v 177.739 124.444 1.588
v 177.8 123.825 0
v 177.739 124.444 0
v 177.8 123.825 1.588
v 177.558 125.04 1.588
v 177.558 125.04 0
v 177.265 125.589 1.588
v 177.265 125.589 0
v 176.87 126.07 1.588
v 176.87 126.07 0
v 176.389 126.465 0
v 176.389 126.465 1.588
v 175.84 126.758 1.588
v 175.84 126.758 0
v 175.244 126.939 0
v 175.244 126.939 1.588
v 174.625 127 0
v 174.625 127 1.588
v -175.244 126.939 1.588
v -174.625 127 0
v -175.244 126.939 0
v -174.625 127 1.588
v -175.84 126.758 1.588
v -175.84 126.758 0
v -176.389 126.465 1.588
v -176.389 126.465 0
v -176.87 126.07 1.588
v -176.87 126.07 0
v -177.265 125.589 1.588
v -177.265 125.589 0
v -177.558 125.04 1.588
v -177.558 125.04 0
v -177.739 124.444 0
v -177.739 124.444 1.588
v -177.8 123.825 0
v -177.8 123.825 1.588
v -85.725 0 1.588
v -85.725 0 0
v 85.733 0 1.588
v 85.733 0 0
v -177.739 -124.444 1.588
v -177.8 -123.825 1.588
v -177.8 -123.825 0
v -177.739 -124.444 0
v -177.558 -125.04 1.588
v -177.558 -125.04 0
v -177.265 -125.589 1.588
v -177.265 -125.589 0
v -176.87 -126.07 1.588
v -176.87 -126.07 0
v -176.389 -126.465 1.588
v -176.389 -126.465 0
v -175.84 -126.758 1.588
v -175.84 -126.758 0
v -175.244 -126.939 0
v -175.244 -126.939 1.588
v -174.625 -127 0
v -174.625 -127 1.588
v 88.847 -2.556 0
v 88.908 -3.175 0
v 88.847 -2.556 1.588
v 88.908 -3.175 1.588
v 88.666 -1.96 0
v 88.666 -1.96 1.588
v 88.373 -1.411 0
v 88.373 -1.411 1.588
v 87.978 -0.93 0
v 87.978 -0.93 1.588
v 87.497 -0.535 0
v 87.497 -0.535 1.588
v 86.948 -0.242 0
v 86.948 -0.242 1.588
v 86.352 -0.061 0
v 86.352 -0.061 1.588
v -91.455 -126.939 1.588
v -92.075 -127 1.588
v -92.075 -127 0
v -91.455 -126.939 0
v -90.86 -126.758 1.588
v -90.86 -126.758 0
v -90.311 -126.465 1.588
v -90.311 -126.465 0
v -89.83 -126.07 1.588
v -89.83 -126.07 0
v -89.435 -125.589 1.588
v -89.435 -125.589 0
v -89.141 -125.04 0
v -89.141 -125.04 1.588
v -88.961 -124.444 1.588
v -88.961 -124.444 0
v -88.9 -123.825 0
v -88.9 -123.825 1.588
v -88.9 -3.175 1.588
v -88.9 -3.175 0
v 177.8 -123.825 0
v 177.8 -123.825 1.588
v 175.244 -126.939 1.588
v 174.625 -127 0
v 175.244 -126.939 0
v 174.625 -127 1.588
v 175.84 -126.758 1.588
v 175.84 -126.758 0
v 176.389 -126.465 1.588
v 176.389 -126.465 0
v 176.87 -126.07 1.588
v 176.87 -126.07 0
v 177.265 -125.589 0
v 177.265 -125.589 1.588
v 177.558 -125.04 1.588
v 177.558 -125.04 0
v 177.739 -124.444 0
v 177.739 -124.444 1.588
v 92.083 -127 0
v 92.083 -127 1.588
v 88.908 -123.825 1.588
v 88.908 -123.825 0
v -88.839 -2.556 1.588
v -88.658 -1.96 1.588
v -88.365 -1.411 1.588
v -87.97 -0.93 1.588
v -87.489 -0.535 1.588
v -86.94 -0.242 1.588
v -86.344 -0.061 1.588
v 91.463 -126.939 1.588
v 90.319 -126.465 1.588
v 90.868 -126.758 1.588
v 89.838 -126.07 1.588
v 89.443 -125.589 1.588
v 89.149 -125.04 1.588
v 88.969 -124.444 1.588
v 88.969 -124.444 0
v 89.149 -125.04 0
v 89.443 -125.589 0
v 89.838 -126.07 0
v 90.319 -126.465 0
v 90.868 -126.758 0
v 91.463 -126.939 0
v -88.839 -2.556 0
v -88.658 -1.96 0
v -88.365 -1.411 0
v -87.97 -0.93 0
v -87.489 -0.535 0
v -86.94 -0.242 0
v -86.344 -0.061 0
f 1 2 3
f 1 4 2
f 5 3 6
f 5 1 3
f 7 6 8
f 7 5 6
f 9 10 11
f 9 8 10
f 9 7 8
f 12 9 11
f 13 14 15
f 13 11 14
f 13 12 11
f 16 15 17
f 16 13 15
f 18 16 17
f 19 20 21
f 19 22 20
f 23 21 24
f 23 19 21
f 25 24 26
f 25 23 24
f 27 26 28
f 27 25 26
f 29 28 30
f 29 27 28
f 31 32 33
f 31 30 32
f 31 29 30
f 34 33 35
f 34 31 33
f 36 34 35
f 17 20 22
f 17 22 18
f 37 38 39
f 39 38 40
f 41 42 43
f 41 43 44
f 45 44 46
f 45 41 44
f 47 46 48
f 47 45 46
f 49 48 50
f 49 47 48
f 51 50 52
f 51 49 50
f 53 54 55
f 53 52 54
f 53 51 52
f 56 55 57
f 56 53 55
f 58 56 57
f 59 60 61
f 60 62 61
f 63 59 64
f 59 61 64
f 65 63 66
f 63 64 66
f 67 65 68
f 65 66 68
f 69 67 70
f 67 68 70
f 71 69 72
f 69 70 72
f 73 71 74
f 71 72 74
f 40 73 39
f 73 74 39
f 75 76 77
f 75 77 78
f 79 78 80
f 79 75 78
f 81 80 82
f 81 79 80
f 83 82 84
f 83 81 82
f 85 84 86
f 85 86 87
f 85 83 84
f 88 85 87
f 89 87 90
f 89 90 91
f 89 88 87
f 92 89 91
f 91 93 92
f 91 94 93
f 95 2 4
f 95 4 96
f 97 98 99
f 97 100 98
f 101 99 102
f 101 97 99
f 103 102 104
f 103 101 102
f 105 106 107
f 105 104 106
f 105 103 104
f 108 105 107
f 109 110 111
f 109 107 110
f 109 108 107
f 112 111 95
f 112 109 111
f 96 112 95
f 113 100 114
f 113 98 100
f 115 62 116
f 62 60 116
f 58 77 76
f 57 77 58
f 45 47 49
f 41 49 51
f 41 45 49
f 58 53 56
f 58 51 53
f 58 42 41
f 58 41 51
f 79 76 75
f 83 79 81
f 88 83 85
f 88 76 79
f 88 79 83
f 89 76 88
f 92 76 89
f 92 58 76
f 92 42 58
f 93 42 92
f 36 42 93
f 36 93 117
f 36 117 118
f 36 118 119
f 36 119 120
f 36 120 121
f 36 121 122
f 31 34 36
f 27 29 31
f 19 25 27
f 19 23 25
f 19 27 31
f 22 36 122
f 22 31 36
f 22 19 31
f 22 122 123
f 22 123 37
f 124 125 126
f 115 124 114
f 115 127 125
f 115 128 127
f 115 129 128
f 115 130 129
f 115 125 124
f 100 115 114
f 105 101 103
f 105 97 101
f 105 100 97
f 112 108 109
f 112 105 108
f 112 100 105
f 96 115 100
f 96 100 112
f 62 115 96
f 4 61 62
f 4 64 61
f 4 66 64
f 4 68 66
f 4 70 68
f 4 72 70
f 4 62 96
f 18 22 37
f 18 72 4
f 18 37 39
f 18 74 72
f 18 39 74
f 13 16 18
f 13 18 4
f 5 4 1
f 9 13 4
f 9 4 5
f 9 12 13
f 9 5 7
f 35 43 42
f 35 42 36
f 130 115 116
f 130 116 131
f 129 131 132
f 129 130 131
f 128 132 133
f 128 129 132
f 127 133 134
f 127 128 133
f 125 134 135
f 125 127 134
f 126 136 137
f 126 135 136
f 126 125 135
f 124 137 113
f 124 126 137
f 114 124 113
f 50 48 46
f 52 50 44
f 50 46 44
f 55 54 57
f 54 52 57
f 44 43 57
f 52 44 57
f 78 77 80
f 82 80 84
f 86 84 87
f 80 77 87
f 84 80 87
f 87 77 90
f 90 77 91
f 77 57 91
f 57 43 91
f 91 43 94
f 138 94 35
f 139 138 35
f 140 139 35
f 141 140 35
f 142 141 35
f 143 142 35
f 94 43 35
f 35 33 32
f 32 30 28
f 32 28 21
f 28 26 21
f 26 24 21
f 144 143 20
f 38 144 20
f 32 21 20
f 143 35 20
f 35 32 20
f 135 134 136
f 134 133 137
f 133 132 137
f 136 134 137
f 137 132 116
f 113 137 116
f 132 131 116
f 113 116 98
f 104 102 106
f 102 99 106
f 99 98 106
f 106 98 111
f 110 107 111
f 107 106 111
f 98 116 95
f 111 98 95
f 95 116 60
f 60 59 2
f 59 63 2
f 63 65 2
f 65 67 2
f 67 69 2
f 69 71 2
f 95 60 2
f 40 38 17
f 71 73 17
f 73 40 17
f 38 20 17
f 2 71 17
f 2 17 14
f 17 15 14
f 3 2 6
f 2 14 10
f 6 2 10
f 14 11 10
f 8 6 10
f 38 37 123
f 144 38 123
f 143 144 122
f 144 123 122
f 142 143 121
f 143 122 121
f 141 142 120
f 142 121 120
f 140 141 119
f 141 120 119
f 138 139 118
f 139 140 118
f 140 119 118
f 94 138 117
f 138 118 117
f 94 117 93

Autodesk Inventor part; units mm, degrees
ref_plane "YZ Plane" through (0, 0, 0) normal (1, 0, 0) x (0, 1, 0)
ref_plane "XZ Plane" through (0, 0, 0) normal (0, 1, 0) x (-1, 0, 0)
ref_plane "XY Plane" through (0, 0, 0) normal (0, 0, 1) x (1, 0, 0)
sketch "Sketch1" plane through (0, 0, 0) normal (0, 0, 1) x (1, 0, 0)
  line L0 (-177.8, 127) -> (177.8, 127)
  line L1 (177.8, 127) -> (177.8, -127)
  line L2 (177.8, -127) -> (-177.8, -127)
  line L3 (-177.8, -127) -> (-177.8, 127)
  line L4 (-88.8998, 127) -> (-88.8998, -127)
  line L5 (88.9077, 127) -> (88.9077, -127)
  line L6 (-88.8998, 0) -> (88.9077, 0)
  point P0 (0, 0)
  dimension "d0" = 355.6
  dimension "d1" = 254
extrude "Extrusion1" add sketch "Sketch1" along normal blind 1.5875 contours L0 L4 L2 L3 | L0 L5 L6 L4 | L0 L1 L2 L5
fillet "Fillet1" radius 3.175 1 edges at (177.8, 127, 0.7937)
fillet "Fillet2" radius 3.175 1 edges at (177.8, -127, 0.7937)
fillet "Fillet3" radius 3.175 1 edges at (-88.8998, -127, 0.7937)
fillet "Fillet4" radius 3.175 1 edges at (-88.8998, 0, 0.7937)
fillet "Fillet5" radius 3.175 1 edges at (-177.8, -127, 0.7937)
fillet "Fillet6" radius 3.175 1 edges at (-177.8, 127, 0.7937)
fillet "Fillet7" radius 3.175 1 edges at (88.9077, -127, 0.7937)
fillet "Fillet8" radius 3.175 1 edges at (88.9077, 0, 0.7937)
properties part number "Blocker"
